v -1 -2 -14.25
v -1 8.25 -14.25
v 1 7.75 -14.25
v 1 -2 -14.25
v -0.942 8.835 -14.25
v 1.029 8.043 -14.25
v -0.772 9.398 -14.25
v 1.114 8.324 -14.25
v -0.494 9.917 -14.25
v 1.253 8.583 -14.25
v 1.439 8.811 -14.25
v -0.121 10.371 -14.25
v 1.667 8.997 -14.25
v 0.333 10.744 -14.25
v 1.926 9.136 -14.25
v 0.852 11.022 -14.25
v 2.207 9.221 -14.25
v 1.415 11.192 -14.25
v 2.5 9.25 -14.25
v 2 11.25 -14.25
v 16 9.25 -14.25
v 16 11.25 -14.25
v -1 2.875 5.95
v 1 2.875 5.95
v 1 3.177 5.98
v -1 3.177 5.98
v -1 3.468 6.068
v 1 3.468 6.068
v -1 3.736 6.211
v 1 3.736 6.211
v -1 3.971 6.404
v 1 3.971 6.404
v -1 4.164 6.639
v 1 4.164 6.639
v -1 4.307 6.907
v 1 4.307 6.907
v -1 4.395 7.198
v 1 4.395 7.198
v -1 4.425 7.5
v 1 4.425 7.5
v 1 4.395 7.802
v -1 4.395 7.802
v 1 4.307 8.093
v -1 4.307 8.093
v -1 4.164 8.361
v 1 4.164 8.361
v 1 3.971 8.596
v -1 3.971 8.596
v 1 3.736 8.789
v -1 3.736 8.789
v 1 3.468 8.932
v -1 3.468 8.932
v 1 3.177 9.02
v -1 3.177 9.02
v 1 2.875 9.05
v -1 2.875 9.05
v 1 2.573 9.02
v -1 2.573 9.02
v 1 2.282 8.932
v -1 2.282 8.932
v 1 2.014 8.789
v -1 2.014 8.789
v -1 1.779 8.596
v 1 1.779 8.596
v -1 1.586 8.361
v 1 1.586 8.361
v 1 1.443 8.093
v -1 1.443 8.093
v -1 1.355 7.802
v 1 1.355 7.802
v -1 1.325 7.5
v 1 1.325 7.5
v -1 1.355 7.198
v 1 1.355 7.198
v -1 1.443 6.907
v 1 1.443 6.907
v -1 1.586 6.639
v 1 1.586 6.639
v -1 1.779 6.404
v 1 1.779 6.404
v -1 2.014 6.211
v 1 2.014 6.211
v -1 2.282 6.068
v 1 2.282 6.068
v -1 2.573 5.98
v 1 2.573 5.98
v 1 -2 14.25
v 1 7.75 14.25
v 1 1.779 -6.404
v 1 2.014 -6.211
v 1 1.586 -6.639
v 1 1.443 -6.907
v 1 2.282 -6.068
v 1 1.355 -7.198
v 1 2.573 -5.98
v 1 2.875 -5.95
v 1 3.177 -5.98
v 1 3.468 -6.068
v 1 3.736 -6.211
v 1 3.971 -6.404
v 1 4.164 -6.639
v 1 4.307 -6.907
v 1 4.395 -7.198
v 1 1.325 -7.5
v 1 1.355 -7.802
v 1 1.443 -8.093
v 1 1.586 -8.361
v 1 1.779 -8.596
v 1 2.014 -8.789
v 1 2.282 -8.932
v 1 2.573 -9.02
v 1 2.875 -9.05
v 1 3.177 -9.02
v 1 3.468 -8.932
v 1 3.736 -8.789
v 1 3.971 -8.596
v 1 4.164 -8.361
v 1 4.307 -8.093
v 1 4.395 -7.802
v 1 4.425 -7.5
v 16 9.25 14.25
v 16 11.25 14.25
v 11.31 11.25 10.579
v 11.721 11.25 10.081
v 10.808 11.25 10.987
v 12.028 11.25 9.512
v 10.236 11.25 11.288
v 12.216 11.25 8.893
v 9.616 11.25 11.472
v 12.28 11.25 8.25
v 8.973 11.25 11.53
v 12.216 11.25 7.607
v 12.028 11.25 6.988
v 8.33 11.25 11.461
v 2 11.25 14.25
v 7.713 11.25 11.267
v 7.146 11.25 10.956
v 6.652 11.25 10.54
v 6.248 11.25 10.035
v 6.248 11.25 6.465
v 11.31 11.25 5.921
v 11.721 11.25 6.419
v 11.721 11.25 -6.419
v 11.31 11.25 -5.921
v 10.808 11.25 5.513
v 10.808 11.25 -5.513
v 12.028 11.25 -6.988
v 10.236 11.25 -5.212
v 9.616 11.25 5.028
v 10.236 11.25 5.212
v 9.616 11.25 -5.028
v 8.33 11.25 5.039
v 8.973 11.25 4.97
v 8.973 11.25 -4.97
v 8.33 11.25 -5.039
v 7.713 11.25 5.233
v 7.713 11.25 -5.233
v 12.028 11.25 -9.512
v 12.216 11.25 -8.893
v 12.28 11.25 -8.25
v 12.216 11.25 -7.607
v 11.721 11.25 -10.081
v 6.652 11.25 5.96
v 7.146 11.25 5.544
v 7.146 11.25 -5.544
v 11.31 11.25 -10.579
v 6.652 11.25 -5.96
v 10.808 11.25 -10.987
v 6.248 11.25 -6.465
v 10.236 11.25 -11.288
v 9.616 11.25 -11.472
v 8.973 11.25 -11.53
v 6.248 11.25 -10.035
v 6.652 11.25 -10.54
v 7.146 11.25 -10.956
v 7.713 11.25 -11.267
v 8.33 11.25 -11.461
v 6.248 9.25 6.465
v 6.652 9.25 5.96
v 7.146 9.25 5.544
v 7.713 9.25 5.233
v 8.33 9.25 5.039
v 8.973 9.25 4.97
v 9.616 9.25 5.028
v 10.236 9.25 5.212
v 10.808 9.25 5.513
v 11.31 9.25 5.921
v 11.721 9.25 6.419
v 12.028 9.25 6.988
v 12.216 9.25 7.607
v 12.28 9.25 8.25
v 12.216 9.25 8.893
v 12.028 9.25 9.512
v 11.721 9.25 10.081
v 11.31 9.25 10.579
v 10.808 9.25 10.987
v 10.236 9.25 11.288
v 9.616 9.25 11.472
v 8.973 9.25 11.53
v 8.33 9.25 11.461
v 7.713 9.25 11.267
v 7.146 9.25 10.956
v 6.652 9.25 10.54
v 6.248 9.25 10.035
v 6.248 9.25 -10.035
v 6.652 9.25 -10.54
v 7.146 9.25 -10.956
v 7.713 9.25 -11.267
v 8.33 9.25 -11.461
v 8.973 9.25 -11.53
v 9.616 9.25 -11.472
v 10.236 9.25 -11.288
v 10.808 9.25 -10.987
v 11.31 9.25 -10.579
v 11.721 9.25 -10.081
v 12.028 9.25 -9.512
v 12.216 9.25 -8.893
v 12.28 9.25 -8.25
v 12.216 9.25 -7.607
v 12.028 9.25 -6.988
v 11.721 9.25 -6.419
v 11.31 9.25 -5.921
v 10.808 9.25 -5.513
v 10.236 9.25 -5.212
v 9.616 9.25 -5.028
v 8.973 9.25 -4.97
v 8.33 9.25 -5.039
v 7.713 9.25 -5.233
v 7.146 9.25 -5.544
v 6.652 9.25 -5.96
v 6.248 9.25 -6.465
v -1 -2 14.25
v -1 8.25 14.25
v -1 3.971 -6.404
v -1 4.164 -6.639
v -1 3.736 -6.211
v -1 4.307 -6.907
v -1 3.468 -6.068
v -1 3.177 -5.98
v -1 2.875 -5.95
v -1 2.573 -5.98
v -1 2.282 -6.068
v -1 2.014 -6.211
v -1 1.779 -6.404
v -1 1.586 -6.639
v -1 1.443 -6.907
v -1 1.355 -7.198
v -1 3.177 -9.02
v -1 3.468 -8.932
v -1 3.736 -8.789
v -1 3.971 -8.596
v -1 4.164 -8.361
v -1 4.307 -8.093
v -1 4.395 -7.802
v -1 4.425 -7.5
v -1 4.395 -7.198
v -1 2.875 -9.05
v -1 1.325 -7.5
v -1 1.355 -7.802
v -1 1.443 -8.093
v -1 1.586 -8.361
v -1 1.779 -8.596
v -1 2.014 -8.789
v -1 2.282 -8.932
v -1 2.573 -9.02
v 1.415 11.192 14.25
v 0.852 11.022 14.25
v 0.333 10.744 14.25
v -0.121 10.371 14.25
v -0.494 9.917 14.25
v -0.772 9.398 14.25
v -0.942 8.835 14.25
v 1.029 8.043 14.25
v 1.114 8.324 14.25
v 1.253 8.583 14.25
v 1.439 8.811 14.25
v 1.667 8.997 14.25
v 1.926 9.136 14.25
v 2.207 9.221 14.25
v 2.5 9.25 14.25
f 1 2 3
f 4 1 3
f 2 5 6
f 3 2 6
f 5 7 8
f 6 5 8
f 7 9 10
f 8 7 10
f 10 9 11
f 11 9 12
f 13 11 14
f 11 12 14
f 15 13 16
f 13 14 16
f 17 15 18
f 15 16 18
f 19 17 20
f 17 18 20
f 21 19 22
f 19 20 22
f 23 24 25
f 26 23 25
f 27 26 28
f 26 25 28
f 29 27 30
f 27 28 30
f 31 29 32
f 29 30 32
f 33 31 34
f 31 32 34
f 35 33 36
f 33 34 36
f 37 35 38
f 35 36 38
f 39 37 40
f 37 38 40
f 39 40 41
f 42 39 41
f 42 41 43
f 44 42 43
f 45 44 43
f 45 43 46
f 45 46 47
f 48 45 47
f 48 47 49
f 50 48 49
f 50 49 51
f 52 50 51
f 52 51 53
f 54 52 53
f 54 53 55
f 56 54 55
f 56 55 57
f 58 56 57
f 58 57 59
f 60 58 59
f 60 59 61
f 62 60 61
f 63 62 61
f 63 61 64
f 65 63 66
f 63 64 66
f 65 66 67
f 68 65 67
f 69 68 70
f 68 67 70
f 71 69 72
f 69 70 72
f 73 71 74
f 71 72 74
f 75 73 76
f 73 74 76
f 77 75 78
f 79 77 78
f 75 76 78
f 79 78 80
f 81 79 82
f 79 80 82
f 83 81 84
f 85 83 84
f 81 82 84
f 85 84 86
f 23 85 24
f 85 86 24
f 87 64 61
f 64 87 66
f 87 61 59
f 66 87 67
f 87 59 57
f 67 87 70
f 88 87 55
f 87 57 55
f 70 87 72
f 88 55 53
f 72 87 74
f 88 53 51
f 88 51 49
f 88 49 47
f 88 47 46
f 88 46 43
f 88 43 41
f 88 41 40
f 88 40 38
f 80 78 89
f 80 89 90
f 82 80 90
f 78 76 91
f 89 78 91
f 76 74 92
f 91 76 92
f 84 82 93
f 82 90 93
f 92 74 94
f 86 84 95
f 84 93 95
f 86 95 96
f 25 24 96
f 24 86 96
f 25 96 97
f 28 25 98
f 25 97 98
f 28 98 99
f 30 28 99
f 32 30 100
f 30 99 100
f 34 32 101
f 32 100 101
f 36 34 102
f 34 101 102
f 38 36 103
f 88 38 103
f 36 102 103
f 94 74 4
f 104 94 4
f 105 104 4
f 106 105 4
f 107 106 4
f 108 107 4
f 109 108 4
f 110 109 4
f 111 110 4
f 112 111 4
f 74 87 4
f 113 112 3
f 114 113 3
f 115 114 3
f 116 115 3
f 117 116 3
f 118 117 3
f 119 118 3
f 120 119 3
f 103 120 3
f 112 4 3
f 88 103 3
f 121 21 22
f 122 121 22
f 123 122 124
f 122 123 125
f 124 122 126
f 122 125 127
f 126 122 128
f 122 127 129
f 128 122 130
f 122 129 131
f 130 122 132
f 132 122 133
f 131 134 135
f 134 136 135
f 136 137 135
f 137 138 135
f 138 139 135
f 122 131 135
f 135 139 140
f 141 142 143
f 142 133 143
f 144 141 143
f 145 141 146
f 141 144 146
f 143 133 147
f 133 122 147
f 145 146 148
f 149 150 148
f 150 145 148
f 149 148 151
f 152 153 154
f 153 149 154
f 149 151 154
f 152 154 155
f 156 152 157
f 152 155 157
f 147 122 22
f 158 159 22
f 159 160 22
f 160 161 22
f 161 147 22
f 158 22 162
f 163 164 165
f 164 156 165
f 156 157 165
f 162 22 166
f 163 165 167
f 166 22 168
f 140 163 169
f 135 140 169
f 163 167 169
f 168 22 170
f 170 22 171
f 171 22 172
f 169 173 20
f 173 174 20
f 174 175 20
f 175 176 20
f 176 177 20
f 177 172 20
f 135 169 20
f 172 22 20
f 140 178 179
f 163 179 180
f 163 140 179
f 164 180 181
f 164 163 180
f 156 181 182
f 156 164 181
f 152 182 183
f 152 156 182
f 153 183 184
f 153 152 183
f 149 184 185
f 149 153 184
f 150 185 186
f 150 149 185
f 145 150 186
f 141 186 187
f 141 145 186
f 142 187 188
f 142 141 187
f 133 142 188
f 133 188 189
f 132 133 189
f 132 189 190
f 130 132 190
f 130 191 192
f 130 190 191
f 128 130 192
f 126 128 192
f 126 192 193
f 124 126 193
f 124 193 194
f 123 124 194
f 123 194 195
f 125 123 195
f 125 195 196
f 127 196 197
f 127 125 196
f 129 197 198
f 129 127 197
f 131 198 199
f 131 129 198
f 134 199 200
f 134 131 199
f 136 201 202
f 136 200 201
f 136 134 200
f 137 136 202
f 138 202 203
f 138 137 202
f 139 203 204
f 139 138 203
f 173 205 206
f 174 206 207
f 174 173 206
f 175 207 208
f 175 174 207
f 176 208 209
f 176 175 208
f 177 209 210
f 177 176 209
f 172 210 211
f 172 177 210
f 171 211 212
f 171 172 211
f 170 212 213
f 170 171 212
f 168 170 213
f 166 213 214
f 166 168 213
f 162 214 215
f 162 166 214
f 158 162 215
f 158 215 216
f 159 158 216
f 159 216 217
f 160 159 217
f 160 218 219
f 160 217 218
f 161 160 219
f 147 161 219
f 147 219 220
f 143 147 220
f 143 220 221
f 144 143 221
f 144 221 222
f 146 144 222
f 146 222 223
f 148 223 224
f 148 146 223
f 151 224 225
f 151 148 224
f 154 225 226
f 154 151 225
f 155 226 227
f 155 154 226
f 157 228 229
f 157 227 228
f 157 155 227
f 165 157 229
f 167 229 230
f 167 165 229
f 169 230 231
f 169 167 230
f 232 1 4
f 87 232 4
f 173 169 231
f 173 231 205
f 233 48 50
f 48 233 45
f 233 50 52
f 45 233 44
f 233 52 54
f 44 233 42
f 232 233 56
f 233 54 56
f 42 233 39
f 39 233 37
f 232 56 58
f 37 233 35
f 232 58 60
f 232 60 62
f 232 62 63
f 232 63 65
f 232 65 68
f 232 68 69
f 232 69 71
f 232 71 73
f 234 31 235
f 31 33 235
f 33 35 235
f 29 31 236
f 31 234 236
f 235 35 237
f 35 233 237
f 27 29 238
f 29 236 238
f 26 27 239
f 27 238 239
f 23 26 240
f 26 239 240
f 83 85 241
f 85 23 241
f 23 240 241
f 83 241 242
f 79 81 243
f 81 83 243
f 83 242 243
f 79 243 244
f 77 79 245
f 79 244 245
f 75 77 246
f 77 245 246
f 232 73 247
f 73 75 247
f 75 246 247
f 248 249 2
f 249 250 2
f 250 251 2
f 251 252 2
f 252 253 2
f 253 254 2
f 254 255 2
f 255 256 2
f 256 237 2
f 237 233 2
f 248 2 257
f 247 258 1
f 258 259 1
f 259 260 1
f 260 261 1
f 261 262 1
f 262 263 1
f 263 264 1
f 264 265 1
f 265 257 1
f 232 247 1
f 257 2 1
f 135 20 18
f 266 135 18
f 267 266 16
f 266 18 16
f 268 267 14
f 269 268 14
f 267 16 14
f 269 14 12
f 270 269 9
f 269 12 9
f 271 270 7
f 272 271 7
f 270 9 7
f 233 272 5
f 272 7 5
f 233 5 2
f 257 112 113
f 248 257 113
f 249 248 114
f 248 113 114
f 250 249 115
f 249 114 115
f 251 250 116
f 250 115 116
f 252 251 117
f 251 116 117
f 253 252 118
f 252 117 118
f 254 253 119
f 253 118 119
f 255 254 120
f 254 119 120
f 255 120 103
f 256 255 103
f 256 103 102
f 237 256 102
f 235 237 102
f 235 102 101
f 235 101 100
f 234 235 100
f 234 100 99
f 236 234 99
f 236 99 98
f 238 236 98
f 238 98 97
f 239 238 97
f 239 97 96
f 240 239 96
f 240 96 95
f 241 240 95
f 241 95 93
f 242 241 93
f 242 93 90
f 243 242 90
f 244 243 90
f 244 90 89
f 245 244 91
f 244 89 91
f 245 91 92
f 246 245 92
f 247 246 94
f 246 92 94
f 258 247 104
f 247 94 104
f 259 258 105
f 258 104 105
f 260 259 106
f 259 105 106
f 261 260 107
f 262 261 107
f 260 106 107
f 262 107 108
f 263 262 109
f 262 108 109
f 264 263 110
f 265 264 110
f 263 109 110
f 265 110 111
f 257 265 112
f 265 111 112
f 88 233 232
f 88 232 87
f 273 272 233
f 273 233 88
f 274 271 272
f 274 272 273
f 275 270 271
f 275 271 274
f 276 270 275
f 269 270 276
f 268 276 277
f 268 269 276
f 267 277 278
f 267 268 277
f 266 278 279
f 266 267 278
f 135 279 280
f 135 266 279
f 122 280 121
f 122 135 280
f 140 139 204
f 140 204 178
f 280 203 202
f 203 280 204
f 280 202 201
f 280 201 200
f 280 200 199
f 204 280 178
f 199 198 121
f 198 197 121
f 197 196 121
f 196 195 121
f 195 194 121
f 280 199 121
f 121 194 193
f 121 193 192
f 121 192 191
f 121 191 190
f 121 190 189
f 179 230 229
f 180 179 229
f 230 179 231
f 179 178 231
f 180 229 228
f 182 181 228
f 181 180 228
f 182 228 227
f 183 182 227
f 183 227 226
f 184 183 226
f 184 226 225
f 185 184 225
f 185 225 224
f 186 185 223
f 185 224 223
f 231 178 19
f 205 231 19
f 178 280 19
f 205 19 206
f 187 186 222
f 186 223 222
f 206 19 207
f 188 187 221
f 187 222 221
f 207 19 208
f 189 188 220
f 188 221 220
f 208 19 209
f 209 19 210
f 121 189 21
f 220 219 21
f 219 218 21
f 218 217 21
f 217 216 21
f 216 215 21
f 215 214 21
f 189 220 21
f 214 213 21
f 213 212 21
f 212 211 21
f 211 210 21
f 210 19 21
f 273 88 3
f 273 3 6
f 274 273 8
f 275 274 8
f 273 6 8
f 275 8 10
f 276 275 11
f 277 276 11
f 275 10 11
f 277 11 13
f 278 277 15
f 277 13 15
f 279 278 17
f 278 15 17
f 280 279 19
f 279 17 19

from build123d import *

# Parameters (mm, degrees)
BOSS_EXTRUDE1_DEPTH      = 14.25
BOSS_EXTRUDE1_DEPTH_BACK = 14.25
CUT_EXTRUDE1_REACH       = 27.192
CUT_EXTRUDE2_REACH       = 25.55
SKETCH3_R                = 1.55


with BuildPart() as part:
    # Sketch1 → Boss-Extrude1 (new, two sides: drawn at the far end of the back side and taken through both)
    with BuildSketch(Plane.XY.offset(-BOSS_EXTRUDE1_DEPTH_BACK)):
        with BuildLine():
            Line((1, 0), (1, 7.75))
            ThreePointArc((1, 7.75), (1.439339828, 8.810660172), (2.5, 9.25))
            Line((2.5, 9.25), (14, 9.25))
            Line((14, 9.25), (16, 9.25))
            Line((16, 9.25), (16, 11.25))
            Line((16, 11.25), (14, 11.25))
            Line((14, 11.25), (2, 11.25))
            ThreePointArc((2, 11.25), (-0.121320344, 10.371320344), (-1, 8.25))
            Line((-1, 8.25), (-1, 0))
            Line((-1, 0), (-1, -2))
            Line((-1, -2), (1, -2))
            Line((1, -2), (1, 0))
        make_face()
    extrude(amount=BOSS_EXTRUDE1_DEPTH + BOSS_EXTRUDE1_DEPTH_BACK)

    # Sketch2 → Cut-Extrude1 (cut, up to next)
    with BuildSketch(Plane(origin=(0, 11.25, 0), x_dir=(1, 0, 0), z_dir=(0, 1, 0)), mode=Mode.PRIVATE) as cut_extrude1_sk1:
        with BuildLine():
            Line((6.248241471, -10.035), (6.248241471, -6.465))
            ThreePointArc((6.248241471, -6.465), (12.28, -8.25), (6.248241471, -10.035))
        make_face()
    cut_extrude1_tool1 = extrude(cut_extrude1_sk1.sketch, amount=-CUT_EXTRUDE1_REACH, mode=Mode.PRIVATE) & part.part
    # Sketch2 → Cut-Extrude1 (cut, up to next)
    with BuildSketch(Plane(origin=(0, 11.25, 0), x_dir=(1, 0, 0), z_dir=(0, 1, 0)), mode=Mode.PRIVATE) as cut_extrude1_sk2:
        with BuildLine():
            Line((6.248241471, 6.465), (6.248241471, 10.035))
            ThreePointArc((6.248241471, 10.035), (12.28, 8.25), (6.248241471, 6.465))
        make_face()
    cut_extrude1_tool2 = extrude(cut_extrude1_sk2.sketch, amount=-CUT_EXTRUDE1_REACH, mode=Mode.PRIVATE) & part.part
    add(cut_extrude1_tool1.solids().sort_by_distance((9.116595, 11.25, 8.25))[0], mode=Mode.SUBTRACT)
    add(cut_extrude1_tool2.solids().sort_by_distance((9.116595, 11.25, -8.25))[0], mode=Mode.SUBTRACT)

    # Sketch3 → Cut-Extrude2 (cut, up to next)
    with BuildSketch(Plane(origin=(1, 0, 0), x_dir=(0, 0, -1), z_dir=(1, 0, 0)), mode=Mode.PRIVATE) as cut_extrude2_sk1:
        with Locations((-7.5, 2.875)):
            Circle(SKETCH3_R)
    cut_extrude2_tool1 = extrude(cut_extrude2_sk1.sketch, amount=-CUT_EXTRUDE2_REACH, mode=Mode.PRIVATE) & part.part
    # Sketch3 → Cut-Extrude2 (cut, up to next)
    with BuildSketch(Plane(origin=(1, 0, 0), x_dir=(0, 0, -1), z_dir=(1, 0, 0)), mode=Mode.PRIVATE) as cut_extrude2_sk2:
        with Locations((7.5, 2.875)):
            Circle(SKETCH3_R)
    cut_extrude2_tool2 = extrude(cut_extrude2_sk2.sketch, amount=-CUT_EXTRUDE2_REACH, mode=Mode.PRIVATE) & part.part
    add(cut_extrude2_tool1.solids().sort_by_distance((1, 2.875, 7.5))[0], mode=Mode.SUBTRACT)
    add(cut_extrude2_tool2.solids().sort_by_distance((1, 2.875, -7.5))[0], mode=Mode.SUBTRACT)


solid = part.part
